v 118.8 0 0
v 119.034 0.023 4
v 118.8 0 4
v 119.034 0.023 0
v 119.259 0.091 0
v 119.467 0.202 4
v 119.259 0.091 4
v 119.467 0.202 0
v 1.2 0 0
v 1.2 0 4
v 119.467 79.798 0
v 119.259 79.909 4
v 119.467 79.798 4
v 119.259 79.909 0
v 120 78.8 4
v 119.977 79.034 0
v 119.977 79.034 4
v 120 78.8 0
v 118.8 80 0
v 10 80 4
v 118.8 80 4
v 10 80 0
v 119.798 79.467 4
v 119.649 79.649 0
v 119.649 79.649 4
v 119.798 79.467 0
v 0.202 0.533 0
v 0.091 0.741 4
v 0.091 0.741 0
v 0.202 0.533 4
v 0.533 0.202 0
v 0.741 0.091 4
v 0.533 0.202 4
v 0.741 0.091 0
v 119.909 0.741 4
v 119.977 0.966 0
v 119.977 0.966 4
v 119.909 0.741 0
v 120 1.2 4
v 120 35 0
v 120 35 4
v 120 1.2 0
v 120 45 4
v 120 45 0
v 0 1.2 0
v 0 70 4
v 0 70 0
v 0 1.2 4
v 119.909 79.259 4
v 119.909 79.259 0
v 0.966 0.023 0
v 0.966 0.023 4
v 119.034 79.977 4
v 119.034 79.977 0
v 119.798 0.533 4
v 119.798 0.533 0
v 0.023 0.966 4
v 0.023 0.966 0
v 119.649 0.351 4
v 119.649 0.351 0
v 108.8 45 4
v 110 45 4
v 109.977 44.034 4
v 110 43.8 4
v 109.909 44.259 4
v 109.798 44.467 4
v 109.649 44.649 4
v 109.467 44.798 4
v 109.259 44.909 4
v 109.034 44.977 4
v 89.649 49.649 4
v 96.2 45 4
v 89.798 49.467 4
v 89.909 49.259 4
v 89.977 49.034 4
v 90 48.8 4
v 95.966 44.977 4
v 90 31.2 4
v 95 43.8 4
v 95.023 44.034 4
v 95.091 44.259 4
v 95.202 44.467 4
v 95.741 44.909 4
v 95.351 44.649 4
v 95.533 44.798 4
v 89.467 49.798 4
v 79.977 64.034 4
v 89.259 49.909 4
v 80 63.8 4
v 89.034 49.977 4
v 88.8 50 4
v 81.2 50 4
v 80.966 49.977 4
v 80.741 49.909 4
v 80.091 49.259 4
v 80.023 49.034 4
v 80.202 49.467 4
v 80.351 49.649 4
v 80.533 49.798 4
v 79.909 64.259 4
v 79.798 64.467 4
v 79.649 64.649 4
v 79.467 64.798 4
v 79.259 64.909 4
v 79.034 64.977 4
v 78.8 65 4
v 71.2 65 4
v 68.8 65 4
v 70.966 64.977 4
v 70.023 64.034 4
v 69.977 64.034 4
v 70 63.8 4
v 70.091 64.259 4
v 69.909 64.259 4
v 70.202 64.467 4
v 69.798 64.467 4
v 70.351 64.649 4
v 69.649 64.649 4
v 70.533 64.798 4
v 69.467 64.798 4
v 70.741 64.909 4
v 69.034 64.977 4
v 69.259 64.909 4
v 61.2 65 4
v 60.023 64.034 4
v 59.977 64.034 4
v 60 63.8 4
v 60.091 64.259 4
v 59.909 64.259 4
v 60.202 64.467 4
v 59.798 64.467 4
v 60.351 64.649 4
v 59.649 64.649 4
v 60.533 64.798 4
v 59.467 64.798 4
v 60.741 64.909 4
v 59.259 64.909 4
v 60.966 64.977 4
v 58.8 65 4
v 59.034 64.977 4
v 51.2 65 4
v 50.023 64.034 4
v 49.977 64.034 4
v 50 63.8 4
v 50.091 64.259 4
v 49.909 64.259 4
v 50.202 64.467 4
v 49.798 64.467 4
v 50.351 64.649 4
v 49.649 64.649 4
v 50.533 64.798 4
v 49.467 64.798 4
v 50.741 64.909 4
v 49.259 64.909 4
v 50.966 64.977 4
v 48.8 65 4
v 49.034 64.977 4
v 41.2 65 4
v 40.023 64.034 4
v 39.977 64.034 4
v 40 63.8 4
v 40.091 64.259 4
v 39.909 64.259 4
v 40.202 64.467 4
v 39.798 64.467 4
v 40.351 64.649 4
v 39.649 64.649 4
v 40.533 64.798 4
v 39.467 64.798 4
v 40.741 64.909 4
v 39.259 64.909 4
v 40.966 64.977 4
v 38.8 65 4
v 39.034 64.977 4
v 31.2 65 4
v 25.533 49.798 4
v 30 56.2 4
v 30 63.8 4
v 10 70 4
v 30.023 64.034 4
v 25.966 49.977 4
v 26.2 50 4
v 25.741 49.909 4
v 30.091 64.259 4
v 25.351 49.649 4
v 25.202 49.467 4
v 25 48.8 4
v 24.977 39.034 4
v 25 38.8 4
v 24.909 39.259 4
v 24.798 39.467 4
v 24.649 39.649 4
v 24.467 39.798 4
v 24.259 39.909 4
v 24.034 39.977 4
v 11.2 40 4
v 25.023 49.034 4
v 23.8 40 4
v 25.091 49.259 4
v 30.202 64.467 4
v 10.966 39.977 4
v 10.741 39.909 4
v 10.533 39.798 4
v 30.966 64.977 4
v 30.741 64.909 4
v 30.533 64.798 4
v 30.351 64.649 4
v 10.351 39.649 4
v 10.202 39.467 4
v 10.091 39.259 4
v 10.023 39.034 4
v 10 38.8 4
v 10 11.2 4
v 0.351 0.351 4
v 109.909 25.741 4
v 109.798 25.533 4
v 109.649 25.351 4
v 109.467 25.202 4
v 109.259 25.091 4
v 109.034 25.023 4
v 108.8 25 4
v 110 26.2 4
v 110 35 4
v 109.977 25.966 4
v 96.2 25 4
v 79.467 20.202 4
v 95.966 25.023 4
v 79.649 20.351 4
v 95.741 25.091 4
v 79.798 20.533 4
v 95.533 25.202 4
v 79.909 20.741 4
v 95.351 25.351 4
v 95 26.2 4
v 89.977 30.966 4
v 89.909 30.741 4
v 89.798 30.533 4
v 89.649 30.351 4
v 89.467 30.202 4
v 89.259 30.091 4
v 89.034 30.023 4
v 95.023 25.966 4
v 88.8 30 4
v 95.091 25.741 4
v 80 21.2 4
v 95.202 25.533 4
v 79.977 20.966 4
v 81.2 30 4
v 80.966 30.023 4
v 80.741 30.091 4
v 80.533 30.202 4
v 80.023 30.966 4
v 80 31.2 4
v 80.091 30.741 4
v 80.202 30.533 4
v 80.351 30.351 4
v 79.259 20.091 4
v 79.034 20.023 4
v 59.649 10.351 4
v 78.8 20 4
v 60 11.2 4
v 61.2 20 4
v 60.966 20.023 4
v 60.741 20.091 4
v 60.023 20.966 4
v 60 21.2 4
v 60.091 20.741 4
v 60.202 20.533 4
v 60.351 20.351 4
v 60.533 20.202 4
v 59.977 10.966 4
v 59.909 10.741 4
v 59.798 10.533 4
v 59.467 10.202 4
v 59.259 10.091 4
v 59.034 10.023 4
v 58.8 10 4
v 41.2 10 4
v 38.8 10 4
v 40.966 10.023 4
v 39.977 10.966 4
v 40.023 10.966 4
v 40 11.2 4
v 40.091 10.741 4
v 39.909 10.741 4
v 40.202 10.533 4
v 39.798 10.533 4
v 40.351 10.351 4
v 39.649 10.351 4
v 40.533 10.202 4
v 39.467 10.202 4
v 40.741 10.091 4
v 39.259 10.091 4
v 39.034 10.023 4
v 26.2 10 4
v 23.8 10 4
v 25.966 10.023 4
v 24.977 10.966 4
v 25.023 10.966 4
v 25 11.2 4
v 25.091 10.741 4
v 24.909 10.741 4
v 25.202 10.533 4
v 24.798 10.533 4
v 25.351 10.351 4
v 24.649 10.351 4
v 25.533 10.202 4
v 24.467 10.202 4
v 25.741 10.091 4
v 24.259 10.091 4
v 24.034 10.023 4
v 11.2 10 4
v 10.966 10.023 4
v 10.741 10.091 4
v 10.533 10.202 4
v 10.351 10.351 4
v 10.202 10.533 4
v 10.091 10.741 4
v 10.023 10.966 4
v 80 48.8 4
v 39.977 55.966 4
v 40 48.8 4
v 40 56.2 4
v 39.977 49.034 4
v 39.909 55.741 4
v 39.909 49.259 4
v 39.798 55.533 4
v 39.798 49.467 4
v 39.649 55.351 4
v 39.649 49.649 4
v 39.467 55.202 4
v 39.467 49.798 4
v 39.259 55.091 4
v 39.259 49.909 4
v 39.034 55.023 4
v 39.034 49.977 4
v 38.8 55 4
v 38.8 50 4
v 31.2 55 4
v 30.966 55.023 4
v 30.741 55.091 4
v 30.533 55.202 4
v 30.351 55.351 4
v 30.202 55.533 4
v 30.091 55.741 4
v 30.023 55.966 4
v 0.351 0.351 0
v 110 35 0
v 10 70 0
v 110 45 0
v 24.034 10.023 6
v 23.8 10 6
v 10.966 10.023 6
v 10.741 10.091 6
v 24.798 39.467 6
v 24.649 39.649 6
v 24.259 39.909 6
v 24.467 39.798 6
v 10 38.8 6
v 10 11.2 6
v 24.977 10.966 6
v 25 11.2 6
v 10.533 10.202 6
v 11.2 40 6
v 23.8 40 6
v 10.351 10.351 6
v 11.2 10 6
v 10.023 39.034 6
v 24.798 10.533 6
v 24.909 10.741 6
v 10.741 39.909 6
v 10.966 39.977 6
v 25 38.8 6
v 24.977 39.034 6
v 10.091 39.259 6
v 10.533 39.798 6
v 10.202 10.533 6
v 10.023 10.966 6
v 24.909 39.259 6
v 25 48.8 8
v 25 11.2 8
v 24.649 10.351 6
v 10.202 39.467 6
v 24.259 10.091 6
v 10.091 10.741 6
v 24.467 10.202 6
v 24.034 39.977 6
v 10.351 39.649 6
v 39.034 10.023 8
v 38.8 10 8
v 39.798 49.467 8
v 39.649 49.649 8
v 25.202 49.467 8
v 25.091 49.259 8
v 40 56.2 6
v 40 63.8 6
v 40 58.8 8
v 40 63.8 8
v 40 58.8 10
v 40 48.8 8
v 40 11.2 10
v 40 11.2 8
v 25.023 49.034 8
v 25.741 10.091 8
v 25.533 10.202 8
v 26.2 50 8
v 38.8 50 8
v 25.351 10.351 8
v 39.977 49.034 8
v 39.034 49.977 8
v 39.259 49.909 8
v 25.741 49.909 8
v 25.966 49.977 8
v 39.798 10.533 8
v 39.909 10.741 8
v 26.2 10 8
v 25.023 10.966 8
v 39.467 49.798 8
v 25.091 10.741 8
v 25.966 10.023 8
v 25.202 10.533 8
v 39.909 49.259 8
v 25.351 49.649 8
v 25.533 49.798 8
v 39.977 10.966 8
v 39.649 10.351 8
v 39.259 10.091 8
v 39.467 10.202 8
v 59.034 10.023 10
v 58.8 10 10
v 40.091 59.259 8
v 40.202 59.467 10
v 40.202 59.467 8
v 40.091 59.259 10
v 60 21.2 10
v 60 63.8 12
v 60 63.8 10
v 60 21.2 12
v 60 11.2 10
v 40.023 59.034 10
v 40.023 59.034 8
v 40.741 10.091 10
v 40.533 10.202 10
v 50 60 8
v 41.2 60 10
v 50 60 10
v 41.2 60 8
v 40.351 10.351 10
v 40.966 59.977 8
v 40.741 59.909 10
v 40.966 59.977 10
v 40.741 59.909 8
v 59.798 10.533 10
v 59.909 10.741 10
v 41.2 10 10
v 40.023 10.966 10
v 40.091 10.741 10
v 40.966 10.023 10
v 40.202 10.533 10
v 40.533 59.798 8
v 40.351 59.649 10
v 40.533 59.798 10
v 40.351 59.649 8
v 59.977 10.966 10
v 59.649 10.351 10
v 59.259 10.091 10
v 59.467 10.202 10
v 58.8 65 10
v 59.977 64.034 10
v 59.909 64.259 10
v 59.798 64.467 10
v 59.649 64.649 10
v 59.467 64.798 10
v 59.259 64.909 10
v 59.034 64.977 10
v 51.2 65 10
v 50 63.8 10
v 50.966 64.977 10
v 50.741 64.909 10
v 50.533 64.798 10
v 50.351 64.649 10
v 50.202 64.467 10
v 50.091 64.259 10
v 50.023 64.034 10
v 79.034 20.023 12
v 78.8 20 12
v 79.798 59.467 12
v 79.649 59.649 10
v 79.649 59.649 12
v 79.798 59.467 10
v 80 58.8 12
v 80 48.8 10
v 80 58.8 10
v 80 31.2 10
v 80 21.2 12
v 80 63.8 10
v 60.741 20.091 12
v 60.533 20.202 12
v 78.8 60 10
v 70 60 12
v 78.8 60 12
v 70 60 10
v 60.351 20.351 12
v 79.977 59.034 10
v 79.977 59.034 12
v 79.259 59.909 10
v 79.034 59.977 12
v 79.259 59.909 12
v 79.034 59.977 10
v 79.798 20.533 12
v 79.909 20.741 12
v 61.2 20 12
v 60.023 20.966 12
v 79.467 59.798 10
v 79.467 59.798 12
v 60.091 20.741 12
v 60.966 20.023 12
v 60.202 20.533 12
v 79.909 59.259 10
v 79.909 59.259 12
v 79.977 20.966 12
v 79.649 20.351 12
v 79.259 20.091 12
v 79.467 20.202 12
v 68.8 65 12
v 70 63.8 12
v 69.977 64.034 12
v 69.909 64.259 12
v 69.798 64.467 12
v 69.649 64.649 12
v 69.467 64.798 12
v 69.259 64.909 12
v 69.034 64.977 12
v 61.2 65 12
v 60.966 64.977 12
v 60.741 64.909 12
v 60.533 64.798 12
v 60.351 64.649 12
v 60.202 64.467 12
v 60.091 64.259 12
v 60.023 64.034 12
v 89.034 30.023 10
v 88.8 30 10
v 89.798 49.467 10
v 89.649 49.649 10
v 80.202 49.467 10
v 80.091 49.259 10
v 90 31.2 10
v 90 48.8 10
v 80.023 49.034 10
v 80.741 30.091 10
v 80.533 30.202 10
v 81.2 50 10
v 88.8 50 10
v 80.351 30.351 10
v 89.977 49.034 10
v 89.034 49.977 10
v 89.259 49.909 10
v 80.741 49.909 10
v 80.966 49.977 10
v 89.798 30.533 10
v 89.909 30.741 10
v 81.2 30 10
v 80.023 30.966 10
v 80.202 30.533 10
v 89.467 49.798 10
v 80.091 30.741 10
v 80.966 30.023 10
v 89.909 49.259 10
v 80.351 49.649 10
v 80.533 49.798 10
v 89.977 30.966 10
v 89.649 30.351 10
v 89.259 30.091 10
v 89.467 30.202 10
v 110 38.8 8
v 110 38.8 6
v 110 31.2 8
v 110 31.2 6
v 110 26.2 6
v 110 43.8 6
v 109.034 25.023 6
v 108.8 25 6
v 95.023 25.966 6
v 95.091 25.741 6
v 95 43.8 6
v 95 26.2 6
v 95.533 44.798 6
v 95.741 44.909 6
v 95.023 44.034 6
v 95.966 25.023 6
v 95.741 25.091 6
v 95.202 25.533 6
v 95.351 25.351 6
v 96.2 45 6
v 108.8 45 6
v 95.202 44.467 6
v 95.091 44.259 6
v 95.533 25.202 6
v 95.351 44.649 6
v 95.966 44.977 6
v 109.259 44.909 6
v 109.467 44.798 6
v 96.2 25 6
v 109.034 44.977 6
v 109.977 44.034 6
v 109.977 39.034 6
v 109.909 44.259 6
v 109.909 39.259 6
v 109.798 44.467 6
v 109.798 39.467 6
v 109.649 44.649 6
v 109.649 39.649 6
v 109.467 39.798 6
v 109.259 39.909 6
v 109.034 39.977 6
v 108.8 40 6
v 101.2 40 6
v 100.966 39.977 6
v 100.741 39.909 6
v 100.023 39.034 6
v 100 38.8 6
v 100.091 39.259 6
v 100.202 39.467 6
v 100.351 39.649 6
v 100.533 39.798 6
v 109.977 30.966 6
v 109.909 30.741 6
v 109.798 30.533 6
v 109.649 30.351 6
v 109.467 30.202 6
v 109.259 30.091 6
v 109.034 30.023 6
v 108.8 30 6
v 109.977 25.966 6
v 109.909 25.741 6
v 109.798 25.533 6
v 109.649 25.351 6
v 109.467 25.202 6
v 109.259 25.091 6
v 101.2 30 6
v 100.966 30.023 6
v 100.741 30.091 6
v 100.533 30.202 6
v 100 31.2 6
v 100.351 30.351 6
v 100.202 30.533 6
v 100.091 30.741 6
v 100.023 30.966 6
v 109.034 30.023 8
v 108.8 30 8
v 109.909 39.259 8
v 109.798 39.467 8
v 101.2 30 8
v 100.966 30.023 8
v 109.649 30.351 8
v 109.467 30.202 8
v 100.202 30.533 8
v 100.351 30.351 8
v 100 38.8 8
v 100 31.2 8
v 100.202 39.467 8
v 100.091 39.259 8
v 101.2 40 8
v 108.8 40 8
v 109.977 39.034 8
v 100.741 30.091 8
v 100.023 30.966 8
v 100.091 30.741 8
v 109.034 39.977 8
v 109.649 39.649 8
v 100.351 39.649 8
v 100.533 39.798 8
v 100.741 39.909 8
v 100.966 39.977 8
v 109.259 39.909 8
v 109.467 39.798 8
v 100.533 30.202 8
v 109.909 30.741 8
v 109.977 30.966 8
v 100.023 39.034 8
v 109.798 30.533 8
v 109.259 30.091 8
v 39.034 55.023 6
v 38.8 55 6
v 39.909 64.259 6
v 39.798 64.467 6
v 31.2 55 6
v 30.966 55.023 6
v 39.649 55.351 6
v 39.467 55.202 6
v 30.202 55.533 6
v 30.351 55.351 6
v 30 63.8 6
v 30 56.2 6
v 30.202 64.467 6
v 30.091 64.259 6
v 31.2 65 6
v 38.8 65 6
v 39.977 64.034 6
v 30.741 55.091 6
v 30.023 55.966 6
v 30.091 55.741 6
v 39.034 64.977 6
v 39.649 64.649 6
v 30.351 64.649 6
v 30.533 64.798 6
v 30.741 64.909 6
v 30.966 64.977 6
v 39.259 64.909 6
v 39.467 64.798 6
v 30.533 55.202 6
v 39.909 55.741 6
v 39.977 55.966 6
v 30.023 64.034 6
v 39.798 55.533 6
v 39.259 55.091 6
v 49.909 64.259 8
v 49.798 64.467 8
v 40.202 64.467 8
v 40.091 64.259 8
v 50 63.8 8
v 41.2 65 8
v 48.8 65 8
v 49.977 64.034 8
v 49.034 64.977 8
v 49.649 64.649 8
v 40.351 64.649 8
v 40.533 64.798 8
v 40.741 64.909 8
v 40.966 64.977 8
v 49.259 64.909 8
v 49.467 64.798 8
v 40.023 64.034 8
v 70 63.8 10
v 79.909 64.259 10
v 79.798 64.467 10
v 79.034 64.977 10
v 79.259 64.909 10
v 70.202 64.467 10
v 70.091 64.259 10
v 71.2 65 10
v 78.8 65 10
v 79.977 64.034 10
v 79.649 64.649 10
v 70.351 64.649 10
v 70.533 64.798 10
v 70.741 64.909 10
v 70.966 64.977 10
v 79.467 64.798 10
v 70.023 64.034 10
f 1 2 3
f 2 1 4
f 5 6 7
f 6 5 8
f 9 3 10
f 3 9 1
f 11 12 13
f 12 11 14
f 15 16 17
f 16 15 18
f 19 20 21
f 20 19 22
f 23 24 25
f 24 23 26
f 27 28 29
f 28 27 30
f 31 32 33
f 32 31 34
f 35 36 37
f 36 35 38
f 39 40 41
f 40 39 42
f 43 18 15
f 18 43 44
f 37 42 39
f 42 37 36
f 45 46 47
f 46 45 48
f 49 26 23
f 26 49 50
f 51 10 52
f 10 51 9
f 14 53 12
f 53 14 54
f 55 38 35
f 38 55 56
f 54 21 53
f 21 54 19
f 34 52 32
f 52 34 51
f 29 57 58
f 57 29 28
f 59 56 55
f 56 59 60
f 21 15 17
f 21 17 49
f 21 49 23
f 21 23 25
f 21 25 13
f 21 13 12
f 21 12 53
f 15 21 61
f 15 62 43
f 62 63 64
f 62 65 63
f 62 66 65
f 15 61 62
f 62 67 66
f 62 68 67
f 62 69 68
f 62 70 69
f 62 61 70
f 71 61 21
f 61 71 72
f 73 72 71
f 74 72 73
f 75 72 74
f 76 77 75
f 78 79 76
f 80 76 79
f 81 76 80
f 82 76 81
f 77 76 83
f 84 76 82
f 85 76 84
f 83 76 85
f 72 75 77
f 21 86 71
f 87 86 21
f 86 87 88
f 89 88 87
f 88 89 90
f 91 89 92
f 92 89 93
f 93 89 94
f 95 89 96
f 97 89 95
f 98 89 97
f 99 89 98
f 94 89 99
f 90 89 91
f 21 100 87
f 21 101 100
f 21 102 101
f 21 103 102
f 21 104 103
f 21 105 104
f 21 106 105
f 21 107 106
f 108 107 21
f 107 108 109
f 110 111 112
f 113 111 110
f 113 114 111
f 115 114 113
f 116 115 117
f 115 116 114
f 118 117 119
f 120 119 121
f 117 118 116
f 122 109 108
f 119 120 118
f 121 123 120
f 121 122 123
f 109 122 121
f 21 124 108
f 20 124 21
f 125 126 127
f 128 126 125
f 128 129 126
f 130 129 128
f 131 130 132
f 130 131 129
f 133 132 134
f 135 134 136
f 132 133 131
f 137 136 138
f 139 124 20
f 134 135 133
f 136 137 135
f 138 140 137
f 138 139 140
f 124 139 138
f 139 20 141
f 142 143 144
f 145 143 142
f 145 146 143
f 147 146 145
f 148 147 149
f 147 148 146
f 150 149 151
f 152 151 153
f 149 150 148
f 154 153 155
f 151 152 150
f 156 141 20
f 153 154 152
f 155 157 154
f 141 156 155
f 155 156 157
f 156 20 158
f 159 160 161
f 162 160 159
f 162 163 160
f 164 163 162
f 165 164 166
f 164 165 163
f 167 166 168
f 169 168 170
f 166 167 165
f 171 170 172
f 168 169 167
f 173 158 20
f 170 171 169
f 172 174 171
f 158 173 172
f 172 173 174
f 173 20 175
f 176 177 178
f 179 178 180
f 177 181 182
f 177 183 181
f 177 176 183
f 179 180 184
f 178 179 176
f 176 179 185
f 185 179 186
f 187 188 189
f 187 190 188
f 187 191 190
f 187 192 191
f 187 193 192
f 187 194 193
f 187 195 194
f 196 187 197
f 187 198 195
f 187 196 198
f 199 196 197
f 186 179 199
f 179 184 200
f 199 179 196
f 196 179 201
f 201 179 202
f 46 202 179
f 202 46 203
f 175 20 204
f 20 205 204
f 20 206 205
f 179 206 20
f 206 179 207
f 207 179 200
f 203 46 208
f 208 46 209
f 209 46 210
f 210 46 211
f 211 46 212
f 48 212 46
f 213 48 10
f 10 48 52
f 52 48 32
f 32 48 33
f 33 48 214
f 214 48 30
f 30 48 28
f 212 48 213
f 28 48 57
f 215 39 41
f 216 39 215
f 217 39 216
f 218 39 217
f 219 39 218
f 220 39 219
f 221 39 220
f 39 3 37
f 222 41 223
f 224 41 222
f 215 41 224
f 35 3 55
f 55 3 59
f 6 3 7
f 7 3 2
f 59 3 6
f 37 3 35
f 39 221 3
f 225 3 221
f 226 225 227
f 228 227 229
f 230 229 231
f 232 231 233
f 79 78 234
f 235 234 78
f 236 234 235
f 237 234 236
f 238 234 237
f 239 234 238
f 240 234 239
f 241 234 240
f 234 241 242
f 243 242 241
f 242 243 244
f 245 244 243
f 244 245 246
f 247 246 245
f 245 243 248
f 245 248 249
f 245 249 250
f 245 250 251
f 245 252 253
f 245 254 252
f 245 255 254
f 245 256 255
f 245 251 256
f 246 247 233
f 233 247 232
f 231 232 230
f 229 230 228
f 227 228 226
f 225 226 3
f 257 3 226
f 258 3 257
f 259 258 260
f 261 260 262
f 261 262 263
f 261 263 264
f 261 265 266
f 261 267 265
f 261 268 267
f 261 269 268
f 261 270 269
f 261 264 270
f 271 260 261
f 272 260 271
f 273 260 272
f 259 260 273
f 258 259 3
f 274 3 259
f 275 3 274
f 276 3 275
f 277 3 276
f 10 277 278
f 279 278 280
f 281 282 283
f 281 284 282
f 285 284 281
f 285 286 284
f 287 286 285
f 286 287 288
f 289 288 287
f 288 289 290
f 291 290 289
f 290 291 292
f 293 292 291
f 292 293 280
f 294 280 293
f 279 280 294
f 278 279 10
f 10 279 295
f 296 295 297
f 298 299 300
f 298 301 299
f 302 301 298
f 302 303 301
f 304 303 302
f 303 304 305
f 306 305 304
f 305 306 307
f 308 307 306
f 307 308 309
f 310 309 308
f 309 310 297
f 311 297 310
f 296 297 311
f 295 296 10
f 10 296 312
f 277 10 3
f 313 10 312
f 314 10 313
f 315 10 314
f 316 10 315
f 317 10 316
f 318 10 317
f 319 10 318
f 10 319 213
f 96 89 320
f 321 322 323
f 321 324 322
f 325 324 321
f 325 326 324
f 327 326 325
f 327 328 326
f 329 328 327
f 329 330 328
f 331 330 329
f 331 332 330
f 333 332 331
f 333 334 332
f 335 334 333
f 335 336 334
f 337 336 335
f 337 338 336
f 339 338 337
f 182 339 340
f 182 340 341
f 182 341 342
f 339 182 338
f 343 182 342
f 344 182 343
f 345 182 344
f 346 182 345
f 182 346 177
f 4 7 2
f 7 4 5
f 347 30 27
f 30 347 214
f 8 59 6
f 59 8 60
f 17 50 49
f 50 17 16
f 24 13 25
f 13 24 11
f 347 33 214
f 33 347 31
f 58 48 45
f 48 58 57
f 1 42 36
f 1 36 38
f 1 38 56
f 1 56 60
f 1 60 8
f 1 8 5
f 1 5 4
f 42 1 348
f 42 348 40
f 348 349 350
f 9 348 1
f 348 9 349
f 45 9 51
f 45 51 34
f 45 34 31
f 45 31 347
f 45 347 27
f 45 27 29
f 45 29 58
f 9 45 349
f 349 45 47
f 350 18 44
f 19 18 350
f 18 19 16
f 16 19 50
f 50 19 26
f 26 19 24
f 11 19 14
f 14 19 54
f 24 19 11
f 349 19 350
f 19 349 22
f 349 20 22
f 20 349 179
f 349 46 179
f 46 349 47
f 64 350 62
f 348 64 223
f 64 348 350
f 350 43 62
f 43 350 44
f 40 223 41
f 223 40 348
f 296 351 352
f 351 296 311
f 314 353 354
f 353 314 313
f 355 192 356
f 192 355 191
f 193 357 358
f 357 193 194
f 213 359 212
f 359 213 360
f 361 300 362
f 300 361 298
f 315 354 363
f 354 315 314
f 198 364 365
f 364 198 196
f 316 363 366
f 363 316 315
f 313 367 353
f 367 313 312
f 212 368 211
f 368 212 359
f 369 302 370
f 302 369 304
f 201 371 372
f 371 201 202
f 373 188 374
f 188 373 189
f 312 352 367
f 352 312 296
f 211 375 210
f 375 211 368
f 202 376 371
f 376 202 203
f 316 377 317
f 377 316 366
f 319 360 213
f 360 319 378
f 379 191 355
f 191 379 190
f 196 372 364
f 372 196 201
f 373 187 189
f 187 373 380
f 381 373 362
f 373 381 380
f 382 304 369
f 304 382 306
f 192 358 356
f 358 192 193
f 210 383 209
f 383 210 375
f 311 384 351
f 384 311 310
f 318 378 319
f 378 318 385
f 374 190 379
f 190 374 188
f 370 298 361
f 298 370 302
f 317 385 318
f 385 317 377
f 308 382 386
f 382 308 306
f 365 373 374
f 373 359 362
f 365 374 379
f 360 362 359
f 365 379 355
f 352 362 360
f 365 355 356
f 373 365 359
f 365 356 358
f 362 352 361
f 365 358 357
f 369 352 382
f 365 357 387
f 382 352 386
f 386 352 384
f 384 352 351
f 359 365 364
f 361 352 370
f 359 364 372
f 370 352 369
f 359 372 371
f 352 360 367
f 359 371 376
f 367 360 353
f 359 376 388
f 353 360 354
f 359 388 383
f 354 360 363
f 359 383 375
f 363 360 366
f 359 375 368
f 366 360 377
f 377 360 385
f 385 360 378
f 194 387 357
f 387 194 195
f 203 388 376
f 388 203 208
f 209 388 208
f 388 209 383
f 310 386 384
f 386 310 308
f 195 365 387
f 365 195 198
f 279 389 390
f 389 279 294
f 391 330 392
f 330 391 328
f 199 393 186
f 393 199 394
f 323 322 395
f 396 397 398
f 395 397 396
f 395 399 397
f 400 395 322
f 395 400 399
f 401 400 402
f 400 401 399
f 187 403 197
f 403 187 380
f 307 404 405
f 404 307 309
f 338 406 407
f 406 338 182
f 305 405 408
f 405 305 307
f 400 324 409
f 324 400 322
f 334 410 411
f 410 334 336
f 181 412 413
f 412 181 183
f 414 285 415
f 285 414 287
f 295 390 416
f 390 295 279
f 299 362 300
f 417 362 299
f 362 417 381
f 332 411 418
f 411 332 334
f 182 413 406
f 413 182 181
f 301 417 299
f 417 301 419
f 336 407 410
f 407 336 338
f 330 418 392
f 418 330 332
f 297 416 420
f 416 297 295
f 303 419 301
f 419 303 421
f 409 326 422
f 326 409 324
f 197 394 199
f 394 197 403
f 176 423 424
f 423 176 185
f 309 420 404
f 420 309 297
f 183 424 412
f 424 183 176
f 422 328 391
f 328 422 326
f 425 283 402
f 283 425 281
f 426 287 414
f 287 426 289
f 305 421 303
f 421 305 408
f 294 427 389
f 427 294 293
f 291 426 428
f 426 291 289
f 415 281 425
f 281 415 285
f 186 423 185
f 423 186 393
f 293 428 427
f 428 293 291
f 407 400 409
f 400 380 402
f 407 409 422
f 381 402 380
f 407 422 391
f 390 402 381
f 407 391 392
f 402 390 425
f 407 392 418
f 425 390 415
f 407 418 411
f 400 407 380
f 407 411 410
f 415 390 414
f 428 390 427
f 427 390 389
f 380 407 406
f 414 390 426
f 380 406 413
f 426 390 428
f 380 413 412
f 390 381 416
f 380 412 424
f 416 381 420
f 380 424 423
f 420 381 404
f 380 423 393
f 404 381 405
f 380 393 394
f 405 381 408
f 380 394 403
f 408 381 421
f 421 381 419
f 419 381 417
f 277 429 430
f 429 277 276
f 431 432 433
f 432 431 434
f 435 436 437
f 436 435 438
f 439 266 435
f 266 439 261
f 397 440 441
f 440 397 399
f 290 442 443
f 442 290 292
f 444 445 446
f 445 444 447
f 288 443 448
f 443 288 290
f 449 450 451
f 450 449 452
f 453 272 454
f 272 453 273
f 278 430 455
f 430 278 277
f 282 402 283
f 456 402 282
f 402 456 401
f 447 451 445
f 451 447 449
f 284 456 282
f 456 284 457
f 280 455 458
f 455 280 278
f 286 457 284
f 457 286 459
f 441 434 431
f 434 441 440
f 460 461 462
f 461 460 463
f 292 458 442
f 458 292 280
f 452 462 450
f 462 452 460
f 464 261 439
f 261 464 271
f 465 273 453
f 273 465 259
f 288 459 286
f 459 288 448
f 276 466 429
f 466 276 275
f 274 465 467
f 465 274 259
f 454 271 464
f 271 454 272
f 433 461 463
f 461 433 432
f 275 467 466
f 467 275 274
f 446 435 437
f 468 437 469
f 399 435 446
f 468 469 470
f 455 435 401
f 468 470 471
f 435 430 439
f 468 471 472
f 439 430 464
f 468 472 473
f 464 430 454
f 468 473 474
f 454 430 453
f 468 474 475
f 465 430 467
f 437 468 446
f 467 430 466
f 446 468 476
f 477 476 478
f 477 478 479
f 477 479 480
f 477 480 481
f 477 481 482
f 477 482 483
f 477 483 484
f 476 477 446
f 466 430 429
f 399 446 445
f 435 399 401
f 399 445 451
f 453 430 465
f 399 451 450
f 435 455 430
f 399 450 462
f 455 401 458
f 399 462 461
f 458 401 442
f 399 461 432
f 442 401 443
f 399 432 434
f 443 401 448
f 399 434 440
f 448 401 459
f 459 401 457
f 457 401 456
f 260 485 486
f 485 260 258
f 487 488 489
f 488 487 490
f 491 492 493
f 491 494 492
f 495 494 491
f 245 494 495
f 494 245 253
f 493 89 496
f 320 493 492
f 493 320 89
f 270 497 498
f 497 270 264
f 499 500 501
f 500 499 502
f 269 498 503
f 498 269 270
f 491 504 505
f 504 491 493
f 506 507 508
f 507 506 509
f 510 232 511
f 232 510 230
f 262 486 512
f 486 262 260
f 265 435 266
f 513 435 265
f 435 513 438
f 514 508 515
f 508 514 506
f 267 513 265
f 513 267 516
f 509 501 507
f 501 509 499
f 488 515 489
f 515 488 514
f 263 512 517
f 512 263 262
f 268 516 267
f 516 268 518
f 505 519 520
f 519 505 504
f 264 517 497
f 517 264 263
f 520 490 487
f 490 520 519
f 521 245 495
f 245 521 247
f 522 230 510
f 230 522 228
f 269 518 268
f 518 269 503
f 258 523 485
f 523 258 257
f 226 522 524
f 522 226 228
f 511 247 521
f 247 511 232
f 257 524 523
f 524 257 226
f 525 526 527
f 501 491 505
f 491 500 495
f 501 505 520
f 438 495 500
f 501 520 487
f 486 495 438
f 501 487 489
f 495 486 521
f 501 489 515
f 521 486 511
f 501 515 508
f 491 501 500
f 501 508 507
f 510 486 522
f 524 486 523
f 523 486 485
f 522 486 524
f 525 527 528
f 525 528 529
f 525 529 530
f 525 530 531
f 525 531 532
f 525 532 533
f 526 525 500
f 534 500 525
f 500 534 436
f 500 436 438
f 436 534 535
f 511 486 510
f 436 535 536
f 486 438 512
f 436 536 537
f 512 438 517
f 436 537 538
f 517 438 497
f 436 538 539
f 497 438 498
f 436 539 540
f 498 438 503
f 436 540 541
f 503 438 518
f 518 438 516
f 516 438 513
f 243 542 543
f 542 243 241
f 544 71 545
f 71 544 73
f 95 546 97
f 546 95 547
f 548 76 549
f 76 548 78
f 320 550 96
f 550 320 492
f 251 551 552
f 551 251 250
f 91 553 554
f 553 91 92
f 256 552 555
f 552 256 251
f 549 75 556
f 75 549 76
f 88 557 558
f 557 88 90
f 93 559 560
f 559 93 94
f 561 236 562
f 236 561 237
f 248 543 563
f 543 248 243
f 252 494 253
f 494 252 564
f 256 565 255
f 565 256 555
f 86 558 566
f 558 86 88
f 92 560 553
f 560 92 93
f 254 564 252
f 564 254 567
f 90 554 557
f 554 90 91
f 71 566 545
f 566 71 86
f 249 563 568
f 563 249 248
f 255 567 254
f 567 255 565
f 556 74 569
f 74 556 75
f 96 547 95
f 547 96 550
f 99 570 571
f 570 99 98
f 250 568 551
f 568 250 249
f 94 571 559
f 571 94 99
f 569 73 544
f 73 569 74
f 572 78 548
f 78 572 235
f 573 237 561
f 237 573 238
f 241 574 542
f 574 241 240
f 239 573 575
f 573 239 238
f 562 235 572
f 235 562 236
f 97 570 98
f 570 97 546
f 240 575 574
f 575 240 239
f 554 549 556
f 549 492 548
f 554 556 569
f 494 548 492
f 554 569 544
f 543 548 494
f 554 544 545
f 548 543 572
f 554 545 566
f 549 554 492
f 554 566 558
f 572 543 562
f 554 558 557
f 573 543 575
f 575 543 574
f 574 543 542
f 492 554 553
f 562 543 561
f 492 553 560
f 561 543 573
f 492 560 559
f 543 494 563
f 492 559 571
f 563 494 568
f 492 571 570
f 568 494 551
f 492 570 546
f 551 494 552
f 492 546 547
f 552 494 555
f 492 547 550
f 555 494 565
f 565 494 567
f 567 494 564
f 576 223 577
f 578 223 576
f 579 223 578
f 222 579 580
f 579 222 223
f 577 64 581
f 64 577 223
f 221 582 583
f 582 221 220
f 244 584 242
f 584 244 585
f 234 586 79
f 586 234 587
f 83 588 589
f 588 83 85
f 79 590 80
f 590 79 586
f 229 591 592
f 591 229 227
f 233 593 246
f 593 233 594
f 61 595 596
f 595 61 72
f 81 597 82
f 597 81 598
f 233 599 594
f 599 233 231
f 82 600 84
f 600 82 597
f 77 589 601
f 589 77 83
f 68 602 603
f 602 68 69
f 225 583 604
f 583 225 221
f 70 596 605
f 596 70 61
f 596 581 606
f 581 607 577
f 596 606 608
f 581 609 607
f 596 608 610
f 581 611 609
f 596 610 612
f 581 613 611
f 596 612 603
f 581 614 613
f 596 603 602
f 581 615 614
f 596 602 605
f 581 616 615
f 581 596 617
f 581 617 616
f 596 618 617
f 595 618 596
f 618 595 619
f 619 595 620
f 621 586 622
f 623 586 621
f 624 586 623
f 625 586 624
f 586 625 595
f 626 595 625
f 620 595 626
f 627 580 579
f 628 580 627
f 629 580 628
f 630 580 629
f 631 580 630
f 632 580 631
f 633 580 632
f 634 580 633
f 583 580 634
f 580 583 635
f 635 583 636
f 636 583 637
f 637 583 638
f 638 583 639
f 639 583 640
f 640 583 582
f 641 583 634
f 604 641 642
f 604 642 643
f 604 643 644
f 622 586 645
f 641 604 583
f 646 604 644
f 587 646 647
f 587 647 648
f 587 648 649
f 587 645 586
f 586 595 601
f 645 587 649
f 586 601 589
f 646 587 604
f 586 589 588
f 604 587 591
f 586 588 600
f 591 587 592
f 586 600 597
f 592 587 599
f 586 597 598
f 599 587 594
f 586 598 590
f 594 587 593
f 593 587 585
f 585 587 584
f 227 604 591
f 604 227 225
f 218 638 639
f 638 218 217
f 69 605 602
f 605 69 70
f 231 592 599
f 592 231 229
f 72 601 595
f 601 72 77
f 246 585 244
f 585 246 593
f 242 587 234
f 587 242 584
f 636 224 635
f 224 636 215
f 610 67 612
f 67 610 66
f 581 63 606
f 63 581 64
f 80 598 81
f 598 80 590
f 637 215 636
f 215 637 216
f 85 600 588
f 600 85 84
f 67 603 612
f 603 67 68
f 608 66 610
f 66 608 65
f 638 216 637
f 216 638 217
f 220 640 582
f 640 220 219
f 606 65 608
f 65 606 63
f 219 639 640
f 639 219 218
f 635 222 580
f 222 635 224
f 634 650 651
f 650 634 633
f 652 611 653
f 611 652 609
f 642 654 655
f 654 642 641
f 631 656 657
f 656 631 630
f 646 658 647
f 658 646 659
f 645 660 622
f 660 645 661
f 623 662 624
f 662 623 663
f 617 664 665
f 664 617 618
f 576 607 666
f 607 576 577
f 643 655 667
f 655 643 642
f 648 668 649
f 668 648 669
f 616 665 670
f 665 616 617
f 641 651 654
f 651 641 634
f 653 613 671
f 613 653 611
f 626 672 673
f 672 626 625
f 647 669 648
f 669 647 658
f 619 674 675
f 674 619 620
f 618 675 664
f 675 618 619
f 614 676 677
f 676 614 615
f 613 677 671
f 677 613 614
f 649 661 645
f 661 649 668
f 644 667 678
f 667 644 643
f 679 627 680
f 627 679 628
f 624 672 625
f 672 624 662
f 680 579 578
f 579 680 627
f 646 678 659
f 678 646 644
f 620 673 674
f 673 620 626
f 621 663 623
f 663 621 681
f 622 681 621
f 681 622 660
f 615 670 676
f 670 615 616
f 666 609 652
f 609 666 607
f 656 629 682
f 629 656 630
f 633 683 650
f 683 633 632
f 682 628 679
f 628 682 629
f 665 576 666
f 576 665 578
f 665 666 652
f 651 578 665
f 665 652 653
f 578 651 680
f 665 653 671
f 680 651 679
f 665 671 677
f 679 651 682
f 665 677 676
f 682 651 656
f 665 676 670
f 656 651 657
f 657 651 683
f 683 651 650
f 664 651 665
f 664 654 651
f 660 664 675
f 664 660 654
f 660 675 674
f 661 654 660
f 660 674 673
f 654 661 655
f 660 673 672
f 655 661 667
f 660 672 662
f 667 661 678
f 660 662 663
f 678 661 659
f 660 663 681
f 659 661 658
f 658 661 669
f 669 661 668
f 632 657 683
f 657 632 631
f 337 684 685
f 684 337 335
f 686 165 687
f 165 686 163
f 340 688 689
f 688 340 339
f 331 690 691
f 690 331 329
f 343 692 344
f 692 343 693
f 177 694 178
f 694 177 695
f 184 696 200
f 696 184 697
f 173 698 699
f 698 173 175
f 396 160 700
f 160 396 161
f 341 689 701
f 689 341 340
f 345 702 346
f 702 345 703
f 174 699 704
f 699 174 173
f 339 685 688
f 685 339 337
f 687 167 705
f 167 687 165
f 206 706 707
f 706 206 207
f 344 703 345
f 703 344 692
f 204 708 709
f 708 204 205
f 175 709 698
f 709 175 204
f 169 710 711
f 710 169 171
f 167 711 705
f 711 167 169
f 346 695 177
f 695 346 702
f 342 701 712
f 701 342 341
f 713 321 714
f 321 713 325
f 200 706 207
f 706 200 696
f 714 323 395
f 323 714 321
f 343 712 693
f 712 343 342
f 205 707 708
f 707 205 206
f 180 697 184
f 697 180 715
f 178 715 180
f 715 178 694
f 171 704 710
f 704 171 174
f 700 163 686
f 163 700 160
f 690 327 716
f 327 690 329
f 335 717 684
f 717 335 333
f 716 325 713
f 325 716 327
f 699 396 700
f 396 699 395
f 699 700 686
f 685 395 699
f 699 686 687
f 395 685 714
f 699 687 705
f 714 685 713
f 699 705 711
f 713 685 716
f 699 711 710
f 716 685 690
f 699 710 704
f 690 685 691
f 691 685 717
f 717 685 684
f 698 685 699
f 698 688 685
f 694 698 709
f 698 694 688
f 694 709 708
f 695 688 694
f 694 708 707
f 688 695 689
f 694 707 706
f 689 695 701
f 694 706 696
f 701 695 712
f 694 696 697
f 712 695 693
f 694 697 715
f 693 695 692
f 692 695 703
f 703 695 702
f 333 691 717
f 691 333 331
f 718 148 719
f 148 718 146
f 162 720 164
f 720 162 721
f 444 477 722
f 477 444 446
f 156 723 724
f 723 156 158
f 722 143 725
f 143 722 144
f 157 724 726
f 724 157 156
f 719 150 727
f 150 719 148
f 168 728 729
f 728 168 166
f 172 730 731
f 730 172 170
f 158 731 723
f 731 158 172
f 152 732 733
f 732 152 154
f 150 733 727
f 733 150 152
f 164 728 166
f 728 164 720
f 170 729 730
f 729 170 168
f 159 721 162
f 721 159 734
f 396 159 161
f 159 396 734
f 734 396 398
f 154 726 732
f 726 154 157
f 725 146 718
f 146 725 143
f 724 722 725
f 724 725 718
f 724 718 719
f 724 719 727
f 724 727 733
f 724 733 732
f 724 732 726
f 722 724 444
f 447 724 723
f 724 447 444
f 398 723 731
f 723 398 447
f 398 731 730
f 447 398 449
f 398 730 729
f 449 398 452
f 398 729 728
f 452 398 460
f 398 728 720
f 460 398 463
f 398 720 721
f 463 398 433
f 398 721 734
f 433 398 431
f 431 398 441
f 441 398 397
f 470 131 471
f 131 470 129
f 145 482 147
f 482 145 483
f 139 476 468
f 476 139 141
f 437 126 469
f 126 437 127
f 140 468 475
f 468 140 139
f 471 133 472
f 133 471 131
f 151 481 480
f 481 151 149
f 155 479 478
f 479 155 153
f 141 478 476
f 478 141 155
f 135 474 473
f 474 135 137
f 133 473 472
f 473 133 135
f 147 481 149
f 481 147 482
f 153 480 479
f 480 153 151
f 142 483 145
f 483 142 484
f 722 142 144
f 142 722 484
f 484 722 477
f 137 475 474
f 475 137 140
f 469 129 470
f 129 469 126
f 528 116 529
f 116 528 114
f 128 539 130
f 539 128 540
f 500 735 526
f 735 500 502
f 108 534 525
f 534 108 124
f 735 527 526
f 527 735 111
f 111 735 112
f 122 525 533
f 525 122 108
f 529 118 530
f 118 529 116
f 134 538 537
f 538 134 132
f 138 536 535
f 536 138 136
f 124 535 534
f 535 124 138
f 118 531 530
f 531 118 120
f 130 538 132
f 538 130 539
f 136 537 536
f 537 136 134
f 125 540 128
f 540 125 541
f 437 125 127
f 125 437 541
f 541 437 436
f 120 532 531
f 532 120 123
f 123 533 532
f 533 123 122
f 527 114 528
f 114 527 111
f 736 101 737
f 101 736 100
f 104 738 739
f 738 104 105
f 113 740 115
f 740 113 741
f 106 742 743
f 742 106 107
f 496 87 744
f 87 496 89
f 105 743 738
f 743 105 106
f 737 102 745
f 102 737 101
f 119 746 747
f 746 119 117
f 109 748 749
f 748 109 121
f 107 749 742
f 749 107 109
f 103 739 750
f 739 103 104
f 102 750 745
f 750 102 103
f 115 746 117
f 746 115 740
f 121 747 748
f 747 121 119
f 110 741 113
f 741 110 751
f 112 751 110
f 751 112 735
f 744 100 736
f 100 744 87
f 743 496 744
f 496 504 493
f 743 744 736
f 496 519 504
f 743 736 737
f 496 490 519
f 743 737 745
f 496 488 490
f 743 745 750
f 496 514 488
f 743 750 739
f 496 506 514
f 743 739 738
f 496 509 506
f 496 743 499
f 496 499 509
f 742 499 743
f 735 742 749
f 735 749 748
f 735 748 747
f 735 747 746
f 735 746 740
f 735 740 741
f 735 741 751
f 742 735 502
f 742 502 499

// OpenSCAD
// Step3D_01_reference.scad
// Легкая параметрическая модель образца Step3D_01 для сайта Step3D.Lab.
// Модель повторяет габариты 120 x 80 x 14 мм и ступенчатую логику образца.
// Используется как публикуемый текстовый 3D-источник внутри репозитория.

$fn = 32;

base_x = 120;
base_y = 80;
base_z = 4;

module rr_cube(size=[10,10,2], r=1.2){
  linear_extrude(height=size[2])
    offset(r=r)
      offset(delta=-r)
        square([size[0], size[1]], center=false);
}

module top_levels(){
  translate([10,10,base_z]) rr_cube([15,30,2]);
  translate([25,10,base_z]) rr_cube([15,40,4]);
  translate([40,10,base_z]) rr_cube([20,50,6]);
  translate([60,20,base_z]) rr_cube([20,40,8]);
  translate([80,30,base_z]) rr_cube([10,20,6]);
  translate([95,25,base_z]) rr_cube([15,20,2]);
  translate([100,30,base_z+2]) rr_cube([10,10,2]);
  translate([30,55,base_z]) rr_cube([10,10,2]);
  translate([40,55,base_z]) rr_cube([10,10,4]);
  translate([50,55,base_z]) rr_cube([10,10,6]);
  translate([60,55,base_z]) rr_cube([10,10,8]);
  translate([70,55,base_z]) rr_cube([10,10,6]);
}

module base_plate(){
  difference(){
    rr_cube([base_x, base_y, base_z], r=1.2);
    translate([0,70,-0.1]) cube([10,10,base_z+0.2]);
    translate([110,35,-0.1]) cube([10,10,base_z+0.2]);
  }
}

union(){
  color("gainsboro") base_plate();
  color("silver") top_levels();
}
